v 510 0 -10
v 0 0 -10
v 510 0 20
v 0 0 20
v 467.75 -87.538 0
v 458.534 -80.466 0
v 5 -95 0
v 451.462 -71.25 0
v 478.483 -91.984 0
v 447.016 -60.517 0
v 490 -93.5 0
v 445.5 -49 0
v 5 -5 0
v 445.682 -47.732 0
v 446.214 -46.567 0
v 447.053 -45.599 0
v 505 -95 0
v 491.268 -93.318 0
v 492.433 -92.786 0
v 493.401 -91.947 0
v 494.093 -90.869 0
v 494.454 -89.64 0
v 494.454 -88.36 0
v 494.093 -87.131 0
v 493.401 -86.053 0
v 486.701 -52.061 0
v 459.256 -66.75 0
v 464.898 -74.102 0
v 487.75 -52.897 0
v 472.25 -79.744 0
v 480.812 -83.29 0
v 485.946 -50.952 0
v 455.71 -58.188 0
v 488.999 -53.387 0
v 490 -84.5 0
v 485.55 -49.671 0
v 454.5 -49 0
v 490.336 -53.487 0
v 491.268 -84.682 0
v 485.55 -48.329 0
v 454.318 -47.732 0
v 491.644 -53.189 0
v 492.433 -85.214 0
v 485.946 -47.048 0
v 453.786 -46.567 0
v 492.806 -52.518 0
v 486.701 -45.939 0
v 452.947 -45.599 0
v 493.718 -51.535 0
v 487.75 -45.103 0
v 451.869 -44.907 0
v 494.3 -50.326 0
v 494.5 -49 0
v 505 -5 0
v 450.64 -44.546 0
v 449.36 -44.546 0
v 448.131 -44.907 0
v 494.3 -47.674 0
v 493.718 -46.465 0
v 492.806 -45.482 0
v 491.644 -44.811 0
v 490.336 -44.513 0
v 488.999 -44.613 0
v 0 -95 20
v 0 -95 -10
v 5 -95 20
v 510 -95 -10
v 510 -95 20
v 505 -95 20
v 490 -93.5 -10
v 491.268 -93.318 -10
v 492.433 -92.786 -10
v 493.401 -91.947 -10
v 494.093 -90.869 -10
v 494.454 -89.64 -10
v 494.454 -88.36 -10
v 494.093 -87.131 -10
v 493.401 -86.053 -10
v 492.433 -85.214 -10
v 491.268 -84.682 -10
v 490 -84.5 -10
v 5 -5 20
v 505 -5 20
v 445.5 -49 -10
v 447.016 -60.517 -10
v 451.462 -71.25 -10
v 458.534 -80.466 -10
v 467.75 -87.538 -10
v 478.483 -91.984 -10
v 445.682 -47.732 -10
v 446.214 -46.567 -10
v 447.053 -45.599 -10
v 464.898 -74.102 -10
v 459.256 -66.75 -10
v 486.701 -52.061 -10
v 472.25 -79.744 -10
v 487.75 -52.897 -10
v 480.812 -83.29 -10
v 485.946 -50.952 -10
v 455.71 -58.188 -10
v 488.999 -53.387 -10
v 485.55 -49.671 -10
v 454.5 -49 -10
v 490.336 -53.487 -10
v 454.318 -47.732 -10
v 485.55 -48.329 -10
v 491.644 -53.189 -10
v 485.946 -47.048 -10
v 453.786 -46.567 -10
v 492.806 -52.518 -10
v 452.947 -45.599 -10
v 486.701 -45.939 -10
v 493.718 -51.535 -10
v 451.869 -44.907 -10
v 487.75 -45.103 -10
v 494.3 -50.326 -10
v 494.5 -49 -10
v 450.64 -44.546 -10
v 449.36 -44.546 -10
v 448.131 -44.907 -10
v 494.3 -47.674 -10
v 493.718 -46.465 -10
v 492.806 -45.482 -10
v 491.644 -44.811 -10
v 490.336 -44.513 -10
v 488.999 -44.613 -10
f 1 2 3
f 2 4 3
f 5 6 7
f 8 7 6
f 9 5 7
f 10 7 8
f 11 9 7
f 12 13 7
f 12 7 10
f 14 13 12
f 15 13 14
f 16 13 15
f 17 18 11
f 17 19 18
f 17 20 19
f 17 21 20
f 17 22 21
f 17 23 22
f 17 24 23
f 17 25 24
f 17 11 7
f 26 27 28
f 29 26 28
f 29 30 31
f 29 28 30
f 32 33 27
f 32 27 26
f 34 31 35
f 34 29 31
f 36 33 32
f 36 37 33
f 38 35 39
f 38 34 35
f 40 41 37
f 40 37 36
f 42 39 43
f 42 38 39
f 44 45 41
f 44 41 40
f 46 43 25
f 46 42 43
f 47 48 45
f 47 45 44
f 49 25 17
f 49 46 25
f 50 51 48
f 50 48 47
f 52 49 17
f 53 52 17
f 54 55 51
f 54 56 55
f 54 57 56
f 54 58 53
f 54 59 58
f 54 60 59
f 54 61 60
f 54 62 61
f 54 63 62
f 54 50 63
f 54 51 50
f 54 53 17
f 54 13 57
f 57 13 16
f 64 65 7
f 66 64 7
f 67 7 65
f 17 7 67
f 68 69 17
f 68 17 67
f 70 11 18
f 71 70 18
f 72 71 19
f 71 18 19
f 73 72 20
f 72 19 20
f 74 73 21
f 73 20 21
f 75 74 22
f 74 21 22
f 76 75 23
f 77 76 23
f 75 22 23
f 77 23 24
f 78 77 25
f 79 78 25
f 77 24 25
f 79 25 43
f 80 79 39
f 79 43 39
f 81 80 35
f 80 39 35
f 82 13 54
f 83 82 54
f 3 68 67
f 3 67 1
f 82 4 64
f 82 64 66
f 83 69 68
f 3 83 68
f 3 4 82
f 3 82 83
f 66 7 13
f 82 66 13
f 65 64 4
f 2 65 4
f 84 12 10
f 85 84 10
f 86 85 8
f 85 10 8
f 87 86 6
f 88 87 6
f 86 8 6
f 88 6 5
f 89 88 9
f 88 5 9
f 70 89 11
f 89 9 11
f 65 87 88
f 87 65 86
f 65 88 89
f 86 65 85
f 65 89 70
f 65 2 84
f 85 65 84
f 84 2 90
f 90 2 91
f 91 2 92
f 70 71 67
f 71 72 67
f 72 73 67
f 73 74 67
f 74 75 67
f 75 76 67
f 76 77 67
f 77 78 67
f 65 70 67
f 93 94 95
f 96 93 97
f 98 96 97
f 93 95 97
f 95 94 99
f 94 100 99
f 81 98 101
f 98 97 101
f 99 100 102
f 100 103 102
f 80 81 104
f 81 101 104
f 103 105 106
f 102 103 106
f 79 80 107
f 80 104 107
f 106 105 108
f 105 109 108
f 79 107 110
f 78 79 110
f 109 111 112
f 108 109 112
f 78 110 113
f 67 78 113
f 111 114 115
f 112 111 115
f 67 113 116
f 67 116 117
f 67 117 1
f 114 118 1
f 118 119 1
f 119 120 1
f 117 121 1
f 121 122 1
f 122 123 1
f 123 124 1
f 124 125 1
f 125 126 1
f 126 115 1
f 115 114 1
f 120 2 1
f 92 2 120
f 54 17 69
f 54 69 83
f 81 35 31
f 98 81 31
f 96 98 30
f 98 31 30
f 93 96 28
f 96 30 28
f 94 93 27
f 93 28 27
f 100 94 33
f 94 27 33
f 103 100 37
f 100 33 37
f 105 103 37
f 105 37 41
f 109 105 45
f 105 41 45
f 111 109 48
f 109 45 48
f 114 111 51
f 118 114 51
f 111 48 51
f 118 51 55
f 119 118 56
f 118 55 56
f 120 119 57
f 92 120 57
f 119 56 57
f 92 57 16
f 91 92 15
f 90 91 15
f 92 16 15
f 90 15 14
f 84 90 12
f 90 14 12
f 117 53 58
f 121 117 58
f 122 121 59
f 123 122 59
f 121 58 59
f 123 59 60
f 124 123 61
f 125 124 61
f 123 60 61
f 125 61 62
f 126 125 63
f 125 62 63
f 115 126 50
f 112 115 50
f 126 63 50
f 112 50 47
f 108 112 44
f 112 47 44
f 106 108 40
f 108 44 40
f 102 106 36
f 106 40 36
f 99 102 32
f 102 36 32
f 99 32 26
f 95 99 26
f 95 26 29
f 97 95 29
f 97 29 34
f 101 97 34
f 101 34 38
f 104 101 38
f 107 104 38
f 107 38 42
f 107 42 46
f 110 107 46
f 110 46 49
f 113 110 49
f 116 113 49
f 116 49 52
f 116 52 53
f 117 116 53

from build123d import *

# Parameters (mm, degrees)
SKETCH1_W           = 510
SKETCH1_H           = 100
SKETCH1_W_2         = 500
SKETCH1_H_2         = 90
BOSS_EXTRUDE1_DEPTH = 20
SKETCH2_W           = 510
SKETCH2_H           = 100
BOSS_EXTRUDE2_DEPTH = 10
SKETCH3_R           = 4.5
CUT_EXTRUDE1_DEPTH  = 1070
SKETCH4_W           = 510
SKETCH4_H           = 5
CUT_EXTRUDE2_DEPTH  = 20


with BuildPart() as part:
    # Sketch1 → Boss-Extrude1 (new body)
    with BuildSketch(Plane.XY):
        with Locations((255, -50)):
            Rectangle(SKETCH1_W, SKETCH1_H)
        with Locations((255, -50)):
            Rectangle(SKETCH1_W_2, SKETCH1_H_2, mode=Mode.SUBTRACT)
    extrude(amount=BOSS_EXTRUDE1_DEPTH)

    # Sketch2 → Boss-Extrude2 (add)
    with BuildSketch(Plane.XY):
        with Locations((255, -50)):
            Rectangle(SKETCH2_W, SKETCH2_H)
    extrude(amount=-BOSS_EXTRUDE2_DEPTH)

    # Sketch3 → Cut-Extrude1 (cut)
    with BuildSketch(Plane.XY):
        with Locations((490, -49)):
            Circle(SKETCH3_R)
        with BuildLine():
            ThreePointArc((490, -93.5), (494.5, -89), (490, -84.5))
            ThreePointArc((490, -84.5), (464.897709268, -74.102290733), (454.5, -49.000000001))
            ThreePointArc((454.5, -49.000000001), (450.000000001, -44.5), (445.5, -49))
            ThreePointArc((445.5, -49), (458.533748237, -80.466251763), (490, -93.5))
        make_face()
    extrude(amount=-CUT_EXTRUDE1_DEPTH, mode=Mode.SUBTRACT)

    # Sketch4 → Cut-Extrude2 (cut, symmetric)
    with BuildSketch(Plane.XY):
        with Locations((255, -97.5)):
            Rectangle(SKETCH4_W, SKETCH4_H)
    extrude(amount=CUT_EXTRUDE2_DEPTH, both=True, mode=Mode.SUBTRACT)


solid = part.part
